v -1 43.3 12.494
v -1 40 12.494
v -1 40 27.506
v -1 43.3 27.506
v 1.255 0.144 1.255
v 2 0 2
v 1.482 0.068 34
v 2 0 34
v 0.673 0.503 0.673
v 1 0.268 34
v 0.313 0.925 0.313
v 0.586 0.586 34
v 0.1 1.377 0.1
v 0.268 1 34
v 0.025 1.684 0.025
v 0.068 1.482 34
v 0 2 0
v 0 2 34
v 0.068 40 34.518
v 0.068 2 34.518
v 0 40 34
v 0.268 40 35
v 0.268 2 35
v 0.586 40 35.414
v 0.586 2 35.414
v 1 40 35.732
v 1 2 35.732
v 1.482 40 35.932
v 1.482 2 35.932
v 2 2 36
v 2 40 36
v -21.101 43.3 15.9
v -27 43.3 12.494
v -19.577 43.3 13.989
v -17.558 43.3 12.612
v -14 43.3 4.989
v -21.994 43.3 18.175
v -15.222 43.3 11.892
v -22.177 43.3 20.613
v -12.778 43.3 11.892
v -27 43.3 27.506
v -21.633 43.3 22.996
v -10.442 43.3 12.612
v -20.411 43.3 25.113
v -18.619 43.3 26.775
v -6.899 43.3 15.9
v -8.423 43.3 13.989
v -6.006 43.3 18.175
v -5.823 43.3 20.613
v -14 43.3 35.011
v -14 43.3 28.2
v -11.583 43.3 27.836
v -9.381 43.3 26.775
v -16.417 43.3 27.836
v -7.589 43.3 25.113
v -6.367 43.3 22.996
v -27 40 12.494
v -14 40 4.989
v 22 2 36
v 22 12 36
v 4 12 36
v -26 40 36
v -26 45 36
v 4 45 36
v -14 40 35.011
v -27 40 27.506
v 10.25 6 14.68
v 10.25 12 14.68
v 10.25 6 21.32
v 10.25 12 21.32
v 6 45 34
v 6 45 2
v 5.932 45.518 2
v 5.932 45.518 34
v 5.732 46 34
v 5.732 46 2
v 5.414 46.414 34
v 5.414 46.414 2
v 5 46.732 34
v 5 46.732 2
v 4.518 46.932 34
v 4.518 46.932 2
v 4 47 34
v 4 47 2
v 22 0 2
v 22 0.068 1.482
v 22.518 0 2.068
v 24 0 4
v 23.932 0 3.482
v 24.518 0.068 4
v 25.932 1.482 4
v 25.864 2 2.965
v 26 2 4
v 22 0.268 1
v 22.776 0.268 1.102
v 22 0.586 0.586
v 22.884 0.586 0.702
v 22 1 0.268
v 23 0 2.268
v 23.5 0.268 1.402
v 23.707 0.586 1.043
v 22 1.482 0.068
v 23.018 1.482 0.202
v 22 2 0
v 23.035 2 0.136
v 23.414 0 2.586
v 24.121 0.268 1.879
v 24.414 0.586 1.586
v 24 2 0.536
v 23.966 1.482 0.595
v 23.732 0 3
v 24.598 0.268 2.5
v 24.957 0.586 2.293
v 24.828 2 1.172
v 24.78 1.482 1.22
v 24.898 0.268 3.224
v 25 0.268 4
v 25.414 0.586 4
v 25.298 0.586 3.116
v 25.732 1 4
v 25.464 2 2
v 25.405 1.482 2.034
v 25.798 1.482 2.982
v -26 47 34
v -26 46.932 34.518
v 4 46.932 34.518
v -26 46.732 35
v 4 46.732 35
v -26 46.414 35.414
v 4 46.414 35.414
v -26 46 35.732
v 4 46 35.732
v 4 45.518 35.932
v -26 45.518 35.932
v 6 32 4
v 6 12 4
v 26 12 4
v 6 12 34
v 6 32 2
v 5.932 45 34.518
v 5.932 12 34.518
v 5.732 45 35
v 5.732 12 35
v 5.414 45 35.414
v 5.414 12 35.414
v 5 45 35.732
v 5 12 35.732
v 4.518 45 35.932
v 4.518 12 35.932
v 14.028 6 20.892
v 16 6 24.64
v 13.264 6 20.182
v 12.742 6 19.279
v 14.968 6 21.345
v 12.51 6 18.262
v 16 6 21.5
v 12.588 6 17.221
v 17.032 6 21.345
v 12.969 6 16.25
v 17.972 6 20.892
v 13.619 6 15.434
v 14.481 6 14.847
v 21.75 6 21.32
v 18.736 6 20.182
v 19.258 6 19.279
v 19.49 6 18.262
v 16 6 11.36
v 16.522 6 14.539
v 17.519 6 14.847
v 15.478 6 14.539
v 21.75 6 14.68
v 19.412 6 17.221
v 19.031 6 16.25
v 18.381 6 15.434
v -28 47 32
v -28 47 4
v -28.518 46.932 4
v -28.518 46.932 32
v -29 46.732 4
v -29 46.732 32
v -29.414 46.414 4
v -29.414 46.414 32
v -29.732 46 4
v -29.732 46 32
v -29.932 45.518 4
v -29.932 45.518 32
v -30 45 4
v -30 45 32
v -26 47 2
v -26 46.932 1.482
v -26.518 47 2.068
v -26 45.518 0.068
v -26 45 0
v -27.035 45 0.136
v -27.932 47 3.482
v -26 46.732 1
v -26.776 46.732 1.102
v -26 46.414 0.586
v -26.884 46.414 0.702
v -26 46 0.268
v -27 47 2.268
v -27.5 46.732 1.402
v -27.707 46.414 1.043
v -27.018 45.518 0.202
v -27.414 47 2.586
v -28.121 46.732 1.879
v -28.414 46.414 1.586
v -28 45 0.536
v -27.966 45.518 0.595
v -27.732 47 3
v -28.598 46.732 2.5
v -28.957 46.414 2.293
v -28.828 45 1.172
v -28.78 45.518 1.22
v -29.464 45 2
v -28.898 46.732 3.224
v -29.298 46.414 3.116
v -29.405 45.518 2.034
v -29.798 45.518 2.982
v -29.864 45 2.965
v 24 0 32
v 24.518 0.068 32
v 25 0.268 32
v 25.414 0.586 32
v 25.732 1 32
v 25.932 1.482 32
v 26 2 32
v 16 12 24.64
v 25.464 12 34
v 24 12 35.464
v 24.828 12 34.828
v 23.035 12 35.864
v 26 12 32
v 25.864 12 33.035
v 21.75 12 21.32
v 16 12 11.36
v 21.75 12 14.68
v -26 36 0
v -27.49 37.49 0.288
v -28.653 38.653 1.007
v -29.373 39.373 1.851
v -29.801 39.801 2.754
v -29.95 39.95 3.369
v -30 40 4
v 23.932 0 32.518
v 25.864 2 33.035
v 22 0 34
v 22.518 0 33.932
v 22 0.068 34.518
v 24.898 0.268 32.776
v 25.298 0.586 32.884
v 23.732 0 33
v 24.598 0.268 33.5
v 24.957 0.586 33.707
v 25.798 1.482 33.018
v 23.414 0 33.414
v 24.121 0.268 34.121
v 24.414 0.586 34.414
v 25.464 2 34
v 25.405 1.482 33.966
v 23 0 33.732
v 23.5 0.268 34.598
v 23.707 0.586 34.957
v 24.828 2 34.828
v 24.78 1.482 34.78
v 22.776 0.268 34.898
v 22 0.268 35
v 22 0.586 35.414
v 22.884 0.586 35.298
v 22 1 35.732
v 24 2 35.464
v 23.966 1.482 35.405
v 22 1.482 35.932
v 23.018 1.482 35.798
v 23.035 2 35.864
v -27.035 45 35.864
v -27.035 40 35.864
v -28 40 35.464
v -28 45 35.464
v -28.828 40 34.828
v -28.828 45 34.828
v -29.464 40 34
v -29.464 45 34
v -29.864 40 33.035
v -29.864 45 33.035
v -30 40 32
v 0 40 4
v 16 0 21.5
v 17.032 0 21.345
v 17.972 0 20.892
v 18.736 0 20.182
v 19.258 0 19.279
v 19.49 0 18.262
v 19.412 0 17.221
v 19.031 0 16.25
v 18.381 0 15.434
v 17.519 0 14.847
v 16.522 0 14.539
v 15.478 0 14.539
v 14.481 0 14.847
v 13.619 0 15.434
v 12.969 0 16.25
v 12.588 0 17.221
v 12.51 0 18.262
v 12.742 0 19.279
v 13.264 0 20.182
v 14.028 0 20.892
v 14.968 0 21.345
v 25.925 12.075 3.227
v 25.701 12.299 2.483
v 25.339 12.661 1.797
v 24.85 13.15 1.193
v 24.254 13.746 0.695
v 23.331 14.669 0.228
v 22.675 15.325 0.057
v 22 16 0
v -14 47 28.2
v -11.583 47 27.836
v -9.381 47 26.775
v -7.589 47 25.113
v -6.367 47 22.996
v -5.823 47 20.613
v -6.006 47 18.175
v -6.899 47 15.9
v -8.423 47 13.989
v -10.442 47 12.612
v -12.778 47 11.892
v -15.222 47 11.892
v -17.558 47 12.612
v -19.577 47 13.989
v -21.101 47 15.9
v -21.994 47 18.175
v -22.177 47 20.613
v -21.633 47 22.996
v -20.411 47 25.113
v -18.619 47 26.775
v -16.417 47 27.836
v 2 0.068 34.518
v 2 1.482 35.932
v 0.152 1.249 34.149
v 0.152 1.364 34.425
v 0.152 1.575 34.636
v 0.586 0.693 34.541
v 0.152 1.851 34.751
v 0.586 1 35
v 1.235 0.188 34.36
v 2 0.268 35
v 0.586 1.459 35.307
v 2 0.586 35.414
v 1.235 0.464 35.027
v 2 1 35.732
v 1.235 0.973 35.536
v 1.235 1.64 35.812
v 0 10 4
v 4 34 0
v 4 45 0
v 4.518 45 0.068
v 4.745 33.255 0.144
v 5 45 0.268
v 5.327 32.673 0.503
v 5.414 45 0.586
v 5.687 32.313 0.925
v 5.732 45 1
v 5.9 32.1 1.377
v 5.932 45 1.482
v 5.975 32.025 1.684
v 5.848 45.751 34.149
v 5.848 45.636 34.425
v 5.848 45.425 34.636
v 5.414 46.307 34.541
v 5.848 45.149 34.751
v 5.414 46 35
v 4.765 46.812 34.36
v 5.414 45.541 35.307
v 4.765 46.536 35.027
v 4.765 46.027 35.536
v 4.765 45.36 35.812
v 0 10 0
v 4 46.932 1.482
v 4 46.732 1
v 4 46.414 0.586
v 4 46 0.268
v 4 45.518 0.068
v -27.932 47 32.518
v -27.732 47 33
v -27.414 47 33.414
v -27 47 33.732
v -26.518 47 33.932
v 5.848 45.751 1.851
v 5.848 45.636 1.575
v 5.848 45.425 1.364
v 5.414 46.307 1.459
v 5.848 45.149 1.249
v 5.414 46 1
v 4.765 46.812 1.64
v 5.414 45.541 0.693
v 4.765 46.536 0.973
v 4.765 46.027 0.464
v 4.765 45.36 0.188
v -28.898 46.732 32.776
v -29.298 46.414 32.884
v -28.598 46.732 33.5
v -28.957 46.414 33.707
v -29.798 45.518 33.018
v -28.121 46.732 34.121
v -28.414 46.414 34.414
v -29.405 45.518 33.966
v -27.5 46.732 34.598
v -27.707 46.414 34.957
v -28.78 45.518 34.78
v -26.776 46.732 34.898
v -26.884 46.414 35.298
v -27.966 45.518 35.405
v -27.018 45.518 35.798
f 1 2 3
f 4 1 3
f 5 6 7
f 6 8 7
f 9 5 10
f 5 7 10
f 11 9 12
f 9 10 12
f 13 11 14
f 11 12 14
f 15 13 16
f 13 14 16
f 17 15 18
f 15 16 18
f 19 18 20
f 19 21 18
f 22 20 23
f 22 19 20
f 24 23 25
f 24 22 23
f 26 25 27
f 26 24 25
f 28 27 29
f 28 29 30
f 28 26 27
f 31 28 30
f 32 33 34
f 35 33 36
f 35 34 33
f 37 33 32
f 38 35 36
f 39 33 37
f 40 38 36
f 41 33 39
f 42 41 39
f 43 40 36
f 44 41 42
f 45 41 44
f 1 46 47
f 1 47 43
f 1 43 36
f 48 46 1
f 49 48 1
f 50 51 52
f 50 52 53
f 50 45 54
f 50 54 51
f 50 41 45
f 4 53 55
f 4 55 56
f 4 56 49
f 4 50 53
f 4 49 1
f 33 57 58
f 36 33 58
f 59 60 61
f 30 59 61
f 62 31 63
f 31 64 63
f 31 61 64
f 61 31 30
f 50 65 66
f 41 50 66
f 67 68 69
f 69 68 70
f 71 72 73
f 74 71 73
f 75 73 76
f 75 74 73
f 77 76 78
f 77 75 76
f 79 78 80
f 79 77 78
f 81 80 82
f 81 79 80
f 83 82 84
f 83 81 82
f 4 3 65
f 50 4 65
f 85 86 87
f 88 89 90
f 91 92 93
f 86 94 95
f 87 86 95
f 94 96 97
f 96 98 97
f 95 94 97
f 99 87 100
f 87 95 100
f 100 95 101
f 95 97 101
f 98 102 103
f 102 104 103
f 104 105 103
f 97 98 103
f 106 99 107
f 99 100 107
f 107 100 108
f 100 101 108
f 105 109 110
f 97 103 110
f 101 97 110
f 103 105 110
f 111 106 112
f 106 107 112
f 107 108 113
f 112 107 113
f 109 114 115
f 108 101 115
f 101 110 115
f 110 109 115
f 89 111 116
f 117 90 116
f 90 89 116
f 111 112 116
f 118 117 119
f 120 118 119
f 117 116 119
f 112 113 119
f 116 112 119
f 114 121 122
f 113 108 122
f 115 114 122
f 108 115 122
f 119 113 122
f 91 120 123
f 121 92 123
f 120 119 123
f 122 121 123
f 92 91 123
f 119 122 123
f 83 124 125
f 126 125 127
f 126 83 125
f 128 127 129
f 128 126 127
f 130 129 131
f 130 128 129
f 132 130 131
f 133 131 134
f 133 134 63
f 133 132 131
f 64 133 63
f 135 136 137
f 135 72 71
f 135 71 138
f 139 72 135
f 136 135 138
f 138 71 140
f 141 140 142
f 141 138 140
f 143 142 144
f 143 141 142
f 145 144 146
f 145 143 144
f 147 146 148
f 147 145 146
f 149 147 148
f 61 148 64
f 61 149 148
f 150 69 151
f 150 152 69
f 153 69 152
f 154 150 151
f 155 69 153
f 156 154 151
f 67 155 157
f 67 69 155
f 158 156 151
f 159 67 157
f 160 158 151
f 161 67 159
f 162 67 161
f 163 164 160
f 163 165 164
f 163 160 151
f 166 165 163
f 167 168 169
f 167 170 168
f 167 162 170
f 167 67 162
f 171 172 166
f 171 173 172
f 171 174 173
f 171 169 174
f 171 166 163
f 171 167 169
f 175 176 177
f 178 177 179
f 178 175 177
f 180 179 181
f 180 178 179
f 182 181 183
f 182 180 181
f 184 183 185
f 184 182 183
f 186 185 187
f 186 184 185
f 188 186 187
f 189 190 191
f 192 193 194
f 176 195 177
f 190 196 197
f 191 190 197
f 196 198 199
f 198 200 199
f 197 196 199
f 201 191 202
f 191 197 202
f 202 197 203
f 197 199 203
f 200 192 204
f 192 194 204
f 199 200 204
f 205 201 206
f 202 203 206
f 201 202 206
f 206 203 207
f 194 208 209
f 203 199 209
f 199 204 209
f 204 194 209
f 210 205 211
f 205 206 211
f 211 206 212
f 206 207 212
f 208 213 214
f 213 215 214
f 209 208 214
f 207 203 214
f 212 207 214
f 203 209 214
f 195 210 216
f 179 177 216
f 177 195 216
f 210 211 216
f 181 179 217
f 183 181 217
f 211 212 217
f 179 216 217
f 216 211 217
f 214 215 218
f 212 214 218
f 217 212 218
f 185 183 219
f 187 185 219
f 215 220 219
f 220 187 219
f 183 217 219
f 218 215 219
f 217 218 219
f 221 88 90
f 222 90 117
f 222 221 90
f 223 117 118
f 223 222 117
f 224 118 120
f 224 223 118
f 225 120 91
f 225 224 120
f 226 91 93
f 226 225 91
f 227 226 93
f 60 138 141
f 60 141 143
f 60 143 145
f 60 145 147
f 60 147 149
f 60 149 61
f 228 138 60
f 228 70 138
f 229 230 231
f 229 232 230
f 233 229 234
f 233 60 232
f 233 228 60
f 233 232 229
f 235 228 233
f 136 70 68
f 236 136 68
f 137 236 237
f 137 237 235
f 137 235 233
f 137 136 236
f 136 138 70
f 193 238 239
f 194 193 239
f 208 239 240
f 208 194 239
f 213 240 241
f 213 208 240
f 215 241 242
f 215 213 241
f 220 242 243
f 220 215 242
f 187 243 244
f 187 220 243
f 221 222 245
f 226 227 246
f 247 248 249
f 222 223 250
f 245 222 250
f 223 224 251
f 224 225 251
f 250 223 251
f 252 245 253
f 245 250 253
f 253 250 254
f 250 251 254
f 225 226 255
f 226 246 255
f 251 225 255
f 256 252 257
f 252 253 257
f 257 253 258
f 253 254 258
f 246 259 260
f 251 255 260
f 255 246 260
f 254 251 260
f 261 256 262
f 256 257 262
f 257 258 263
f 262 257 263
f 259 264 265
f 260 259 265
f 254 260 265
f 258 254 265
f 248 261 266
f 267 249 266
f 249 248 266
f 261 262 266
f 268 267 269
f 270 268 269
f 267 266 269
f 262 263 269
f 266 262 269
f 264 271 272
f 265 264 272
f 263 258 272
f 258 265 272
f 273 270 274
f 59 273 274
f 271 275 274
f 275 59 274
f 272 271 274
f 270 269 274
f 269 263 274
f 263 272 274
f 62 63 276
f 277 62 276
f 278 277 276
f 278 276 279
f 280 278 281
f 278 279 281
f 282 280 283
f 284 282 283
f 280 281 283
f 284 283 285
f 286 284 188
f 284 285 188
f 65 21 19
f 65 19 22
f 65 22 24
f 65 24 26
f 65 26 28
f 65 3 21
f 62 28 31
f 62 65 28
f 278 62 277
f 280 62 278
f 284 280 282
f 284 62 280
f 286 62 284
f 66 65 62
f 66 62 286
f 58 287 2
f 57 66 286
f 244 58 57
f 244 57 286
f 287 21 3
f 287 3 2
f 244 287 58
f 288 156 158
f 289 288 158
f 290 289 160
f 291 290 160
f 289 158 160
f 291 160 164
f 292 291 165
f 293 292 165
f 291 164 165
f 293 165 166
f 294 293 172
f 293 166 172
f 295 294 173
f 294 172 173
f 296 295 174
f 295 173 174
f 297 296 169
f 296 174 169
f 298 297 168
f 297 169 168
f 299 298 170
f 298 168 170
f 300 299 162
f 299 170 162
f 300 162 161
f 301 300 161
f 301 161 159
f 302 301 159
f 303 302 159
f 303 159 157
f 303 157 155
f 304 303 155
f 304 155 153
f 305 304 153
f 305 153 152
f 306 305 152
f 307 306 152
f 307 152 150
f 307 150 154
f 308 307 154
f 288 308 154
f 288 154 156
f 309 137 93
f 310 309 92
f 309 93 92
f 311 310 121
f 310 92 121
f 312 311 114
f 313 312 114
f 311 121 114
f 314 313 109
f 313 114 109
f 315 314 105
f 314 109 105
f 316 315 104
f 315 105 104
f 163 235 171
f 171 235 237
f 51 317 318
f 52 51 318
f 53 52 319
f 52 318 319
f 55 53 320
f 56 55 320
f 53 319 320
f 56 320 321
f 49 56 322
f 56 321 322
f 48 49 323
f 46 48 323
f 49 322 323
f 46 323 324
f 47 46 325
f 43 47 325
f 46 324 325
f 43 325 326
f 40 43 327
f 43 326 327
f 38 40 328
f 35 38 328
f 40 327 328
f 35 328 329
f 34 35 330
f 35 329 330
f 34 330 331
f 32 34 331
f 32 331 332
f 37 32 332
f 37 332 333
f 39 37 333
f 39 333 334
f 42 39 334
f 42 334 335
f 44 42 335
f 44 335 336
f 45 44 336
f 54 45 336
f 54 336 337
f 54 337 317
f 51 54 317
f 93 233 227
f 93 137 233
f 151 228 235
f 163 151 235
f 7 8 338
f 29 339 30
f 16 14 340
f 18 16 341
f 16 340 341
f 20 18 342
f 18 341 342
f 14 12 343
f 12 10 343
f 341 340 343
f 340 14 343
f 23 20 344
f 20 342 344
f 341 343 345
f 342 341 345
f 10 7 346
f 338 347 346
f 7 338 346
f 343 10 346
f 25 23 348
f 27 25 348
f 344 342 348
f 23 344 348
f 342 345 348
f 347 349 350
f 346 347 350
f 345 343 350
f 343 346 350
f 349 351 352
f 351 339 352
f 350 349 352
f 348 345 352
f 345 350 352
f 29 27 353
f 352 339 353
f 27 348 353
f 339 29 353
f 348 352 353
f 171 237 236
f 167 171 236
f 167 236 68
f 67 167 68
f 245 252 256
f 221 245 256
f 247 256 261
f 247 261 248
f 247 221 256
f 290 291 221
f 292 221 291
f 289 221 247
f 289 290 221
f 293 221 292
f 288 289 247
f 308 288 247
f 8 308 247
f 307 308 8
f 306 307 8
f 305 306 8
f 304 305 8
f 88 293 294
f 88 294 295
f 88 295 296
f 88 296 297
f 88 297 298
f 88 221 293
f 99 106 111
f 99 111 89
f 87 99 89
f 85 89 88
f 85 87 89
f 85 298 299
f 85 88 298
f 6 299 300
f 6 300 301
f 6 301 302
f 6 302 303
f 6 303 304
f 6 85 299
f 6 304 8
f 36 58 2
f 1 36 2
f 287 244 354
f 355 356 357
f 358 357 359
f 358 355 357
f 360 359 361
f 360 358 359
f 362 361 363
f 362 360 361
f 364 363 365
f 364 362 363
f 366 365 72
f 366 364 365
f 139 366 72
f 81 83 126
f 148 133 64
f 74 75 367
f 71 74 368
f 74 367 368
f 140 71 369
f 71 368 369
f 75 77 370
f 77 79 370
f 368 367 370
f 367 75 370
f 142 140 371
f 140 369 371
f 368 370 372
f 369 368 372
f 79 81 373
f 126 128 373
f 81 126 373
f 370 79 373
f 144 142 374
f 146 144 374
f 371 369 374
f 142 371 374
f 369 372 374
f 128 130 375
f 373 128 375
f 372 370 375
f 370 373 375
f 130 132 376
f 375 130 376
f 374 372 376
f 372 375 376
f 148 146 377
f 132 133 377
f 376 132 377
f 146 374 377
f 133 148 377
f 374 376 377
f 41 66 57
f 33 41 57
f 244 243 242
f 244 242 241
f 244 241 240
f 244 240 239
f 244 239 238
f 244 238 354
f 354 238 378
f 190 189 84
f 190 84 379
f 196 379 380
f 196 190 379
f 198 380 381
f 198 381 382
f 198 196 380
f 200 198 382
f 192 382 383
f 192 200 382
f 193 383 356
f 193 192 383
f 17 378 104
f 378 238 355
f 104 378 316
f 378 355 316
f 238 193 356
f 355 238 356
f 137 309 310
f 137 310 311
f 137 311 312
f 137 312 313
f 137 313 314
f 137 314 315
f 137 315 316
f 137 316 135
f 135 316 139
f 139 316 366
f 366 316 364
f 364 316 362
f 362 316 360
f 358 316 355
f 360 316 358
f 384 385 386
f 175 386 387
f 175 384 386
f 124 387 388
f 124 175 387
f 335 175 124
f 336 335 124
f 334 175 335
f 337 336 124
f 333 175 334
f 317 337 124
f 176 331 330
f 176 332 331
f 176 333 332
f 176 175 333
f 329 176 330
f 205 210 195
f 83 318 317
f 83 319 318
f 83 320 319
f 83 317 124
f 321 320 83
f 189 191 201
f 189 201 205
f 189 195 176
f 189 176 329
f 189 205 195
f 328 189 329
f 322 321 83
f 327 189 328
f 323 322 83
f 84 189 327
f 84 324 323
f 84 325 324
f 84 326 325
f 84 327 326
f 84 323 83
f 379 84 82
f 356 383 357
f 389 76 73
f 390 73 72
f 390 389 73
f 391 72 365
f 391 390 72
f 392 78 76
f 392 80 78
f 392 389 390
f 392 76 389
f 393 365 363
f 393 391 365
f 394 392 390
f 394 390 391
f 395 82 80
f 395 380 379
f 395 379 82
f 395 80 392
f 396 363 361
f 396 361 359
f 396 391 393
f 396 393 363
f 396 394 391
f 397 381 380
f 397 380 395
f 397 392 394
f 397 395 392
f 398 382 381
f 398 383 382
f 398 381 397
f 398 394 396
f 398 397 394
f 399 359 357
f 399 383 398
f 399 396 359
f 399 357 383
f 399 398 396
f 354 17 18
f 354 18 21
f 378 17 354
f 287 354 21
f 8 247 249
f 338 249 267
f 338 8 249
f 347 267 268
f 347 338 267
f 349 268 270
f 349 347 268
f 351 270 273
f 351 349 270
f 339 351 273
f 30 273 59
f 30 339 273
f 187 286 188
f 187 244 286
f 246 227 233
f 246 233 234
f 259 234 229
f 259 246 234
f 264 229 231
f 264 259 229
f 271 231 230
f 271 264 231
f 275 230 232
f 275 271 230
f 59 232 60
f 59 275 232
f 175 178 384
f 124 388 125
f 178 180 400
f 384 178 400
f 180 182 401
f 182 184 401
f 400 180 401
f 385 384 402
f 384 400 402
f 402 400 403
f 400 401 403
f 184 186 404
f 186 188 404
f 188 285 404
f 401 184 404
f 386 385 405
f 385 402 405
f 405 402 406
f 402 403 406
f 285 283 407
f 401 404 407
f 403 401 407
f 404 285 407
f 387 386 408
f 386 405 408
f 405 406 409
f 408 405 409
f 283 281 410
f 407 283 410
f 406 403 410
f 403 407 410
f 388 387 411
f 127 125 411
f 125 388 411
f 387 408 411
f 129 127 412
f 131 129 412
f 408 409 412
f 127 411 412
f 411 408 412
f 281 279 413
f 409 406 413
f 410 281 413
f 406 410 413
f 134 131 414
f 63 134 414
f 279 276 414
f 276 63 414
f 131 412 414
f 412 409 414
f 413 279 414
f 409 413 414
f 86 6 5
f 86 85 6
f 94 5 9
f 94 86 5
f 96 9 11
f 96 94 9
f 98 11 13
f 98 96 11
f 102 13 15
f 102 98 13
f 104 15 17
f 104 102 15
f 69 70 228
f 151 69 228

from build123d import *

# Parameters (mm, degrees)
BOSS_EXTRUDE1_DEPTH = 36
SKETCH3_R           = 3.5
CUT_EXTRUDE1_DEPTH  = 32
SKETCH2_R           = 8.2
CUT_EXTRUDE2_DEPTH  = 32
CUT_EXTRUDE3_DEPTH  = 6
BOSS_EXTRUDE3_DEPTH = 4
CUT_EXTRUDE4_DEPTH  = 3.3
FILLET1_R           = 4
FILLET4_R           = 2


with BuildPart() as part:
    # Sketch1 → Boss-Extrude1 (new body)
    with BuildSketch(Plane.XY):
        Polygon((0, 0), (0, 40), (-30, 40), (-30, 47), (6, 47), (6, 12), (26, 12), (26, 0), align=None)
    extrude(amount=BOSS_EXTRUDE1_DEPTH)

    # Sketch3 → Cut-Extrude1 (cut)
    with BuildSketch(Plane(origin=(0, 12, 0), x_dir=(1, 0, 0), z_dir=(0, 1, 0))):
        with Locations(Location((16, -18, 0), (0, 0, 270))):
            Circle(SKETCH3_R)
    extrude(amount=-CUT_EXTRUDE1_DEPTH, mode=Mode.SUBTRACT)

    # Sketch2 → Cut-Extrude2 (cut)
    with BuildSketch(Plane(origin=(0, 47, 0), x_dir=(1, 0, 0), z_dir=(0, 1, 0))):
        with Locations(Location((-14, -20, 0), (0, 0, 270))):
            Circle(SKETCH2_R)
    extrude(amount=-CUT_EXTRUDE2_DEPTH, mode=Mode.SUBTRACT)

    # Sketch4 → Cut-Extrude3 (cut)
    with BuildSketch(Plane(origin=(0, 12, 0), x_dir=(1, 0, 0), z_dir=(0, 1, 0))):
        Polygon((16, -24.639528096), (21.75, -21.319764048), (21.75, -14.680235952), (16, -11.360471904), (10.25, -14.680235952), (10.25, -21.319764048), align=None)
    extrude(amount=-CUT_EXTRUDE3_DEPTH, mode=Mode.SUBTRACT)

    # Sketch5 → Boss-Extrude3 (add)
    with BuildSketch(Plane(origin=(0, 0, 0), x_dir=(-1, 0, 0), z_dir=(0, 0, -1))):
        Polygon((-26, 12), (-6, 32), (-6, 12), align=None)
        Polygon((0, 10), (0, 40), (30, 40), align=None)
    extrude(amount=-BOSS_EXTRUDE3_DEPTH)

    # Sketch6 → Cut-Extrude4 (cut)
    with BuildSketch(Plane.XZ.offset(-40)):
        Polygon((-14, 4.988893001), (-1, 12.494446501), (-1, 27.505553499), (-14, 35.011106999), (-27, 27.505553499), (-27, 12.494446501), align=None)
    extrude(amount=-CUT_EXTRUDE4_DEPTH, mode=Mode.SUBTRACT)

    # Fillet1
    fillet1_edges = [part.edges().sort_by_distance(p)[0] for p in [
        (26, 6, 0),
        (-30, 43.5, 36),
        (26, 6, 36),
        (-30, 43.5, 0),
    ]]
    fillet(fillet1_edges, radius=FILLET1_R)

    # Fillet4
    fillet4_edges = [part.edges().sort_by_distance(p)[0] for p in [
        (26, 0, 18),
        (24.828427125, 0, 1.171572875),
        (24.828427125, 0, 34.828427125),
        (-30, 47, 18),
        (11, 0, 0),
        (-28.828427125, 47, 1.171572875),
        (-28.828427125, 47, 34.828427125),
        (0, 0, 18),
        (6, 47, 18),
        (6, 29.5, 36),
        (-10, 47, 36),
        (0, 20, 36),
        (11, 0, 36),
        (6, 39.5, 0),
        (-10, 47, 0),
    ]]
    fillet(fillet4_edges, radius=FILLET4_R)


solid = part.part
